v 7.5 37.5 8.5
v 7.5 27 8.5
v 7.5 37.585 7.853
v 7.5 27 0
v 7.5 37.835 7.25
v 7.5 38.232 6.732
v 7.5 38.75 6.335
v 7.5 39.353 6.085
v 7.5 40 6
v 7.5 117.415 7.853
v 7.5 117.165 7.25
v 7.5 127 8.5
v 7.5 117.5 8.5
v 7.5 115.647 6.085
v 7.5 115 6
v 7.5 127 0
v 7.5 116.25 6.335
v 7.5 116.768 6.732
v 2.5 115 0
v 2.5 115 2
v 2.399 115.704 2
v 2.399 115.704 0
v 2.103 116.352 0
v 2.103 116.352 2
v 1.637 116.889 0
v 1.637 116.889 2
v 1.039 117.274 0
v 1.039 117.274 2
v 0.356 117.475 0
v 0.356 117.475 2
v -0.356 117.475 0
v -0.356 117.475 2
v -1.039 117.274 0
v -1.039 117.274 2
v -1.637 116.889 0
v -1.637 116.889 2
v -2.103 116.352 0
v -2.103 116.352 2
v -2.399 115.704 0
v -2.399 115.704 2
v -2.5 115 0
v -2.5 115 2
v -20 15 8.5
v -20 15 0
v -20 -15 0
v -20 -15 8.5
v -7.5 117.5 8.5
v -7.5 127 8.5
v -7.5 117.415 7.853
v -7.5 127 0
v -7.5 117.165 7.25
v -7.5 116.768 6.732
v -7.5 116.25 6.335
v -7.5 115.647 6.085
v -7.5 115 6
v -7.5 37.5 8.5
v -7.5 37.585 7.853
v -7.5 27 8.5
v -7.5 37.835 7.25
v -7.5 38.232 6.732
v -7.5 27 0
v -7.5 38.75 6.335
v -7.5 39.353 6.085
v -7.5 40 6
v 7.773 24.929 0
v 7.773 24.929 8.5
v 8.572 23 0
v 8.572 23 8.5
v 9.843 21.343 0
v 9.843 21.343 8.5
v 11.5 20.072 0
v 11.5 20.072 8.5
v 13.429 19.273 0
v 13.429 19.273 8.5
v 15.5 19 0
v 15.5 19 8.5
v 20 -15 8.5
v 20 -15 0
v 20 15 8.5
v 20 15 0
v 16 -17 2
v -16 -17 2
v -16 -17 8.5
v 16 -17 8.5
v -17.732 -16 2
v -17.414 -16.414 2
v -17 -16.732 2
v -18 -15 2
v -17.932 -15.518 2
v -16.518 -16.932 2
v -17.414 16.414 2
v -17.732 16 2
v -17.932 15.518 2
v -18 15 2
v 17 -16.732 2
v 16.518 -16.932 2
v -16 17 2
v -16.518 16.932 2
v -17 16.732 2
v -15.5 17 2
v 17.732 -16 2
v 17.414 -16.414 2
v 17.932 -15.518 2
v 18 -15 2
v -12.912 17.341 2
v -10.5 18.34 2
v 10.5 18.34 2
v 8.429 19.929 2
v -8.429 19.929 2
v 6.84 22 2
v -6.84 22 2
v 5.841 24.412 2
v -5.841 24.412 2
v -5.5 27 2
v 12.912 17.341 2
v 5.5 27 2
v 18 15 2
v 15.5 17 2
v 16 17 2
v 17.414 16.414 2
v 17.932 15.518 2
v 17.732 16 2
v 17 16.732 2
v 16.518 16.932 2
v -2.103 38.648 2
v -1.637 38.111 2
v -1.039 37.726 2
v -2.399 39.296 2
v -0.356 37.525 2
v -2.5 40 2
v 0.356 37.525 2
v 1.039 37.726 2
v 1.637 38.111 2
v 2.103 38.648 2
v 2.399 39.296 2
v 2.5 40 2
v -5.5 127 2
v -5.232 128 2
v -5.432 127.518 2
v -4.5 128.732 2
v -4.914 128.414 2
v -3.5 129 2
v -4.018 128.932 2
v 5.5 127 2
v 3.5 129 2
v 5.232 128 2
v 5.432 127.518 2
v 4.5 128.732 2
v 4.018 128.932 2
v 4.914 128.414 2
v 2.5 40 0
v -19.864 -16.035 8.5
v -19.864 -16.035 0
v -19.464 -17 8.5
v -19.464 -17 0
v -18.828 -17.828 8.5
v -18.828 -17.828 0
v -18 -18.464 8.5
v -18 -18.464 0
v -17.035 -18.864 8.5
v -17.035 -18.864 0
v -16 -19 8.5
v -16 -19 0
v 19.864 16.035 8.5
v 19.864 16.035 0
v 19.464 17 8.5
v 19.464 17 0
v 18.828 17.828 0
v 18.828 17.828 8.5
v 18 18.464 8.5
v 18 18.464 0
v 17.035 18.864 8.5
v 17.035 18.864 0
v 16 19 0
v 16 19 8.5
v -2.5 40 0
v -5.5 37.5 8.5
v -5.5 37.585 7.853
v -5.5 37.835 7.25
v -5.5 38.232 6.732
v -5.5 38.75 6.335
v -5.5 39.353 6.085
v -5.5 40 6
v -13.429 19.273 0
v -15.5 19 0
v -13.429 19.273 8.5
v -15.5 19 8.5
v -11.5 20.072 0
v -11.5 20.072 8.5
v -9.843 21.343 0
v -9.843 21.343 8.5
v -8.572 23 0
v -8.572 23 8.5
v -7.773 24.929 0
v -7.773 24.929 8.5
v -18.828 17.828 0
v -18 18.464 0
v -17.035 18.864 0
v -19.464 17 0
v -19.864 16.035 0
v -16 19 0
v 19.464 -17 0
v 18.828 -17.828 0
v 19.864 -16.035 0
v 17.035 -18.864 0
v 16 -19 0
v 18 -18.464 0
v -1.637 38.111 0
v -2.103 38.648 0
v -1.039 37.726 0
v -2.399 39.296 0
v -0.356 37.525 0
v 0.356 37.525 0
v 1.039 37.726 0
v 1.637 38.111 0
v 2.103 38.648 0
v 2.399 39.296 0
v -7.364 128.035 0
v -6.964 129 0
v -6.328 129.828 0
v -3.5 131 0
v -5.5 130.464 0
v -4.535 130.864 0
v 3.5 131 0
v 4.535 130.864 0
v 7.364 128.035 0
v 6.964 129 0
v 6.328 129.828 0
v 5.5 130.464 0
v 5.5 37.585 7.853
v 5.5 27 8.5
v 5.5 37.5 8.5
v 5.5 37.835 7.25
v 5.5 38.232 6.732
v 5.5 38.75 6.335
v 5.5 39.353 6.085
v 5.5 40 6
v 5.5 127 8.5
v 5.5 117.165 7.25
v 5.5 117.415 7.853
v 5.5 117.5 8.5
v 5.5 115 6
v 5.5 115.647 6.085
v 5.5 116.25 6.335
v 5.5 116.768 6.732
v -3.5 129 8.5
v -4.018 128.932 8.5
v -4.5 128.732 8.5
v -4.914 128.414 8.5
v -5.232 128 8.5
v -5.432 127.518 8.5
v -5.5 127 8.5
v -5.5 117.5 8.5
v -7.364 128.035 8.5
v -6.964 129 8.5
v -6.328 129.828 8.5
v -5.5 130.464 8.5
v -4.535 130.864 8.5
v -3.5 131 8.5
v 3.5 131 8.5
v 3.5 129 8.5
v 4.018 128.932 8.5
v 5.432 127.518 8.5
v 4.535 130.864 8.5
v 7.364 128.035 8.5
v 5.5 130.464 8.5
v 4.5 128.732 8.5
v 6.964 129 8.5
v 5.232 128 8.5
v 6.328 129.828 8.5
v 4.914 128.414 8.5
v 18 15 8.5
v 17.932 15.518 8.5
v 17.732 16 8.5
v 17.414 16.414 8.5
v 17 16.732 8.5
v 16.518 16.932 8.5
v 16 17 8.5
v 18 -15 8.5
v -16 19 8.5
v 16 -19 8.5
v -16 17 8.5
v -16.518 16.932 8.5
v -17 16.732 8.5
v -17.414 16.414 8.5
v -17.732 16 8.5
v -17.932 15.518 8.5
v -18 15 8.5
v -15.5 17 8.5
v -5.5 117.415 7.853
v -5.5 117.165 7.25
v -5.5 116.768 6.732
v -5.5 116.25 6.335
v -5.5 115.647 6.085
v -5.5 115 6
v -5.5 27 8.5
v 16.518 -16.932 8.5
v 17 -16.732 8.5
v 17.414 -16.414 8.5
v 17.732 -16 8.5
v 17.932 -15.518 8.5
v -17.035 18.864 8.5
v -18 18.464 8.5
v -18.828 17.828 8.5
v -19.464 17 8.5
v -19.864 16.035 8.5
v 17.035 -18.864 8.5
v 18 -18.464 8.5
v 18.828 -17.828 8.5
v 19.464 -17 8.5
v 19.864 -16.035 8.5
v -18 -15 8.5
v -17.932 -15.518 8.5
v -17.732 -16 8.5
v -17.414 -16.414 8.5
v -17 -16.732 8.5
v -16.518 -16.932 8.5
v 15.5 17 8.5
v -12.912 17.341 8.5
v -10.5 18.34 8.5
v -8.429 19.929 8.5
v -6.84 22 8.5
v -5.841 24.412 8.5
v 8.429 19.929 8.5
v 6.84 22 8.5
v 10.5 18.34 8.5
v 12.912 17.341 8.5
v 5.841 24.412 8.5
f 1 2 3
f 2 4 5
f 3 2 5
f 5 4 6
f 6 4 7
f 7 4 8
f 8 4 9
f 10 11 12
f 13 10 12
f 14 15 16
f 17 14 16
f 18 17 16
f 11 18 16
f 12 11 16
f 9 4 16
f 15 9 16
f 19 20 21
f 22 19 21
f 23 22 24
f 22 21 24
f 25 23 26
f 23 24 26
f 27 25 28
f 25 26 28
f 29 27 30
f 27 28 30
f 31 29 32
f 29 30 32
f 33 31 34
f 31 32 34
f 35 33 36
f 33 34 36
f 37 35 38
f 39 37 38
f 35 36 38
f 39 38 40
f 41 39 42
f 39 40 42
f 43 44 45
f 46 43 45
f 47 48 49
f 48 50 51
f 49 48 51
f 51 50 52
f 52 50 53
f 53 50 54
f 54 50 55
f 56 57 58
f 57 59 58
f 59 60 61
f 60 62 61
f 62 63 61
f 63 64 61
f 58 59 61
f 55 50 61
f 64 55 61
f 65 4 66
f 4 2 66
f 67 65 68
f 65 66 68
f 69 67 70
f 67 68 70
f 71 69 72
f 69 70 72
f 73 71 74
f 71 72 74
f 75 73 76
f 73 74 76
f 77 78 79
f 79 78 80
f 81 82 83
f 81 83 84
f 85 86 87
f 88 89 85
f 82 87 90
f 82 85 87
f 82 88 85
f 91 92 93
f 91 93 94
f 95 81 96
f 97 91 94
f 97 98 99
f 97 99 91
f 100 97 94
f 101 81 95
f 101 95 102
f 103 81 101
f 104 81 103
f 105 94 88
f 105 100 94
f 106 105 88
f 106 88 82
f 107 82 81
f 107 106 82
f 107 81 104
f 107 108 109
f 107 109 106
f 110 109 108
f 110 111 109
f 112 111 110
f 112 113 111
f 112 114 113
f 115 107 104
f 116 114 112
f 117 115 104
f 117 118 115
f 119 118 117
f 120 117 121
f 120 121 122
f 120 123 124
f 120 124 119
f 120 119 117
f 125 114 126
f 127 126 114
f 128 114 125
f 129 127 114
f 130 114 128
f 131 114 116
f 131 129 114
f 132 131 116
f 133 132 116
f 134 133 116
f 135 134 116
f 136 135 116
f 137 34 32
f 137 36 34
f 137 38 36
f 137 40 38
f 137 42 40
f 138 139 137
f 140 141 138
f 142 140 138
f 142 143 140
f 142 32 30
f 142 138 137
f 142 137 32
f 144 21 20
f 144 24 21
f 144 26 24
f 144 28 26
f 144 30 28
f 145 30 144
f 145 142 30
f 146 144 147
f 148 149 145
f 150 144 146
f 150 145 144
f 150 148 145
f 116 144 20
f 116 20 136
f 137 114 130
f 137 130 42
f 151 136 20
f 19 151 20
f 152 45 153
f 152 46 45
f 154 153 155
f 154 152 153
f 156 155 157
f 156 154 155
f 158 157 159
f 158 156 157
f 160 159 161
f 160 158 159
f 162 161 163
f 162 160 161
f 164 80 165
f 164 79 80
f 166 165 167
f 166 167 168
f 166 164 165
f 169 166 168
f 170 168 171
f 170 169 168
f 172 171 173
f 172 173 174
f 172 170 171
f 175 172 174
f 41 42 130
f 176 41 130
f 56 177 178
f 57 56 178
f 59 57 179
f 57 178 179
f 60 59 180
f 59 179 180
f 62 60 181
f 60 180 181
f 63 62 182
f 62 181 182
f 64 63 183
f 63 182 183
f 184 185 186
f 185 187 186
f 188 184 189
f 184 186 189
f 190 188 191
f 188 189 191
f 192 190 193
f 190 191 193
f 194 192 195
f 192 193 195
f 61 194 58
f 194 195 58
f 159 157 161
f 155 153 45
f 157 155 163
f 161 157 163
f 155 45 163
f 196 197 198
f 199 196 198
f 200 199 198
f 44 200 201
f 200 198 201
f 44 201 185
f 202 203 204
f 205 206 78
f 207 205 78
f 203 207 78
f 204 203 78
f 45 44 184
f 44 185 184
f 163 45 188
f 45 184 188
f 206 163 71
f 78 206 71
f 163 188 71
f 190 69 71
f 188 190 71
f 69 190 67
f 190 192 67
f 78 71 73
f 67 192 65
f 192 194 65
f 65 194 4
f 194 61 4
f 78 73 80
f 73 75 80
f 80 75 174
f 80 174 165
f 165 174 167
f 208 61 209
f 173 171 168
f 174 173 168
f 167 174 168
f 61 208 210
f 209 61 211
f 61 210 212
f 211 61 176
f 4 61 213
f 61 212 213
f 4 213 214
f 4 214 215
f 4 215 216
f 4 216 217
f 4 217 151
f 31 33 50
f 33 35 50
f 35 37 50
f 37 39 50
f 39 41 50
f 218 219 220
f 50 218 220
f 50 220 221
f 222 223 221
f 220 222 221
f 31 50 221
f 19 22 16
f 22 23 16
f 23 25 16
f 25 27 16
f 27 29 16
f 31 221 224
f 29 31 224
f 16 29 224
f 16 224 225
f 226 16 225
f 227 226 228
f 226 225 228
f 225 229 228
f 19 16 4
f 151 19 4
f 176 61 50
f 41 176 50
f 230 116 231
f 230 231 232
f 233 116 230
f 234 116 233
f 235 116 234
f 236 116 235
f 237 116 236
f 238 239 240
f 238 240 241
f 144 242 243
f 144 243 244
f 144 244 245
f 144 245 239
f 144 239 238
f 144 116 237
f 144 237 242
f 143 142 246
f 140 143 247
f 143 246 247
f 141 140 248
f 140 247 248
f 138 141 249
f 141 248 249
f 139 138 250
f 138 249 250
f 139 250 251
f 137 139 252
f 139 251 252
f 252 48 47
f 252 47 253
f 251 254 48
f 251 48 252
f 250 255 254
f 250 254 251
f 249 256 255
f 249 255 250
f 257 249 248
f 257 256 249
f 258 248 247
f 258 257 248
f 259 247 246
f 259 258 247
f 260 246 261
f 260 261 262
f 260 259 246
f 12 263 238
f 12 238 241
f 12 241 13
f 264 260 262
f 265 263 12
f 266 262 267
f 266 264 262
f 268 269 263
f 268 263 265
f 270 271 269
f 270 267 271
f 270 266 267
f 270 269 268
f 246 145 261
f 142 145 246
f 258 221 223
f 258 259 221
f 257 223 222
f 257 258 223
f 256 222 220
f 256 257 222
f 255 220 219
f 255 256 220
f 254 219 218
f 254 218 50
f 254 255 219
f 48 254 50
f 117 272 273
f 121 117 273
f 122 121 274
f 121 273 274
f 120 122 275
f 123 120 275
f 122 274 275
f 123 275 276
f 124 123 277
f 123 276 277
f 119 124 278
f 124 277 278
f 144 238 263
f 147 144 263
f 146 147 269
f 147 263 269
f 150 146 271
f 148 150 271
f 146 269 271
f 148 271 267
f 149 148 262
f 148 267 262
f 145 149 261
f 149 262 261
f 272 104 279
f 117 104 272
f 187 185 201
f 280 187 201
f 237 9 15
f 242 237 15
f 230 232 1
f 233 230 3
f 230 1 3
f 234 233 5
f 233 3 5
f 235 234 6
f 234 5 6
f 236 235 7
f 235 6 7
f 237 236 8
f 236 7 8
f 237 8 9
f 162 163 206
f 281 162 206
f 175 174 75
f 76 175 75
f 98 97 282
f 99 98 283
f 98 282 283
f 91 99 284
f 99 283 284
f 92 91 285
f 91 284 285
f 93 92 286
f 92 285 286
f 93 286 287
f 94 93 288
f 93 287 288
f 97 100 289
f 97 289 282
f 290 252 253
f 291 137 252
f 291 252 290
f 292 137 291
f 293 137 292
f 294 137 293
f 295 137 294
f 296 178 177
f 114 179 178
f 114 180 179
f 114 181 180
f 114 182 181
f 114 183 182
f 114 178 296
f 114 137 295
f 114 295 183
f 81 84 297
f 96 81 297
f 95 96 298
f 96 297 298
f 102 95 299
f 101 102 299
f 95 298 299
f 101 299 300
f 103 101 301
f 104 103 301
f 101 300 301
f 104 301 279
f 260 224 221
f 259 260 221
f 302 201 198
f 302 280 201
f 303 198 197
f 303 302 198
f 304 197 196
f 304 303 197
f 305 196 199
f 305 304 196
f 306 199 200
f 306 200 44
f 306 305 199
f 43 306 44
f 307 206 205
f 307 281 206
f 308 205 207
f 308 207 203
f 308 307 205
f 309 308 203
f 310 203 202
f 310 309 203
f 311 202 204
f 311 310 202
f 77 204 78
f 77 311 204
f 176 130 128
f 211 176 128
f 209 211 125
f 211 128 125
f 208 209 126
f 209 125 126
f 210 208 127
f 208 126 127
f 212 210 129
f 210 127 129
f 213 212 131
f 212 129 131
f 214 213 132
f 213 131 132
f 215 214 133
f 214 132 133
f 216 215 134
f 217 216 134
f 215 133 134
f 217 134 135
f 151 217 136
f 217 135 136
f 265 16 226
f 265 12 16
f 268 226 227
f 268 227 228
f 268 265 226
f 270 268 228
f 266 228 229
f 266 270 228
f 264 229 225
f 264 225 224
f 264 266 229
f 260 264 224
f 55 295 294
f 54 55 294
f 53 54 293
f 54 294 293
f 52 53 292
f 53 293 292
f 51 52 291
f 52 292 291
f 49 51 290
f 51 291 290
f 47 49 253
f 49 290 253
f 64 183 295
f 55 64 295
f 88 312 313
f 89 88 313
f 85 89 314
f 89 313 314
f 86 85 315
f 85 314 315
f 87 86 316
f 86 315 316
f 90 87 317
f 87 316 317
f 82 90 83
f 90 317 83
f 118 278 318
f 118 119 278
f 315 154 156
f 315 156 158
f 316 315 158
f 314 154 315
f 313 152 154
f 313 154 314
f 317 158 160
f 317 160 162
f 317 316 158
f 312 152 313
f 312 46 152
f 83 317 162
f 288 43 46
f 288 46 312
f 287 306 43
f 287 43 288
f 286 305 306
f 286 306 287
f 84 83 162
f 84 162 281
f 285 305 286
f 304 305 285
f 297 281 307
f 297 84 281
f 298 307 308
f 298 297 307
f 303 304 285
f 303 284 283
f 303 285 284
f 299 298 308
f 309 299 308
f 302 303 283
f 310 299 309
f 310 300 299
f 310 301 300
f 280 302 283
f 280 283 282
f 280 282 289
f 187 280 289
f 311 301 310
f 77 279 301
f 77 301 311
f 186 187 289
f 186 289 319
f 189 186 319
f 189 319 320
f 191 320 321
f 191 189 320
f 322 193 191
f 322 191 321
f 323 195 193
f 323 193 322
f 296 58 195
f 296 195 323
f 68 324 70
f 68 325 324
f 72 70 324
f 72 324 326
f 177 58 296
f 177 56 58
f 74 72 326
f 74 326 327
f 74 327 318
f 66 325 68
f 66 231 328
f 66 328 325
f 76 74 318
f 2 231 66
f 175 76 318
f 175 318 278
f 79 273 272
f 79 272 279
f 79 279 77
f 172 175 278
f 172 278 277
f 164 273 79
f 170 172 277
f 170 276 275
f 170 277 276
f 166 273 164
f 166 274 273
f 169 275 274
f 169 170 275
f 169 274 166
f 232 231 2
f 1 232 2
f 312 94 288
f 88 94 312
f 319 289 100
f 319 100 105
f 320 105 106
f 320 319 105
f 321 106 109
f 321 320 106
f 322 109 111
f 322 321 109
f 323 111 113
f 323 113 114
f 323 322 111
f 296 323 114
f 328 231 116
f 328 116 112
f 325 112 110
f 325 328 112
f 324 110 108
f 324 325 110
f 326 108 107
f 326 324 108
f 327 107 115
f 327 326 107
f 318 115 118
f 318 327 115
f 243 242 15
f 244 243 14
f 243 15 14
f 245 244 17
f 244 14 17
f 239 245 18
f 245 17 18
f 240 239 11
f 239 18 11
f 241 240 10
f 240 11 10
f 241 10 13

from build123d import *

# Parameters (mm, degrees)
F3_DEPTH  = 8.5
F4_R      = 4
F5_R      = 8
F6_T      = -2
F8_DEPTH  = 2
F10_DEPTH = 15


with BuildPart() as f3:
    # F2 (on Top) → F3 (new body)
    with BuildSketch(Plane.XY):
        Polygon((-7.5, 19), (-20, 19), (-20, -19), (20, -19), (20, 19), (7.5, 19), (7.5, 131), (-7.5, 131), align=None)
    extrude(amount=F3_DEPTH)

    # F4
    f4_edges = [f3.edges().sort_by_distance(p)[0] for p in [
        (-20, 19, 4.25),
        (-20, -19, 4.25),
        (20, -19, 4.25),
        (20, 19, 4.25),
        (7.5, 131, 4.25),
        (-7.5, 131, 4.25),
    ]]
    fillet(f4_edges, radius=F4_R)

    # F5
    f5_edges = [f3.edges().sort_by_distance(p)[0] for p in [
        (7.5, 19, 4.25),
        (-7.5, 19, 4.25),
    ]]
    fillet(f5_edges, radius=F5_R)

    # F6
    f6_openings = [f3.faces().sort_by_distance(p)[0] for p in [
        (0, 39.190123, 8.5),
    ]]
    offset(amount=F6_T, openings=f6_openings)

    # F7 (on face) → F8 (cut, through all)
    with BuildSketch(Plane.XY.offset(2)):
        with BuildLine():
            ThreePointArc((2.5, 115), (0, 117.5), (-2.5, 115))
            Line((-2.5, 115), (-2.5, 40))
            ThreePointArc((-2.5, 40), (0, 37.5), (2.5, 40))
            Line((2.5, 40), (2.5, 115))
        make_face()
    extrude(amount=-F8_DEPTH, mode=Mode.SUBTRACT)

    # F9 (on face) → F10 (cut)
    with BuildSketch(Plane.YZ.offset(7.5)):
        with BuildLine():
            Line((115, 11), (40, 11))
            ThreePointArc((40, 11), (37.5, 8.5), (40, 6))
            Line((40, 6), (115, 6))
            ThreePointArc((115, 6), (117.5, 8.5), (115, 11))
        make_face()
    extrude(amount=-F10_DEPTH, mode=Mode.SUBTRACT)


solid = f3.part
